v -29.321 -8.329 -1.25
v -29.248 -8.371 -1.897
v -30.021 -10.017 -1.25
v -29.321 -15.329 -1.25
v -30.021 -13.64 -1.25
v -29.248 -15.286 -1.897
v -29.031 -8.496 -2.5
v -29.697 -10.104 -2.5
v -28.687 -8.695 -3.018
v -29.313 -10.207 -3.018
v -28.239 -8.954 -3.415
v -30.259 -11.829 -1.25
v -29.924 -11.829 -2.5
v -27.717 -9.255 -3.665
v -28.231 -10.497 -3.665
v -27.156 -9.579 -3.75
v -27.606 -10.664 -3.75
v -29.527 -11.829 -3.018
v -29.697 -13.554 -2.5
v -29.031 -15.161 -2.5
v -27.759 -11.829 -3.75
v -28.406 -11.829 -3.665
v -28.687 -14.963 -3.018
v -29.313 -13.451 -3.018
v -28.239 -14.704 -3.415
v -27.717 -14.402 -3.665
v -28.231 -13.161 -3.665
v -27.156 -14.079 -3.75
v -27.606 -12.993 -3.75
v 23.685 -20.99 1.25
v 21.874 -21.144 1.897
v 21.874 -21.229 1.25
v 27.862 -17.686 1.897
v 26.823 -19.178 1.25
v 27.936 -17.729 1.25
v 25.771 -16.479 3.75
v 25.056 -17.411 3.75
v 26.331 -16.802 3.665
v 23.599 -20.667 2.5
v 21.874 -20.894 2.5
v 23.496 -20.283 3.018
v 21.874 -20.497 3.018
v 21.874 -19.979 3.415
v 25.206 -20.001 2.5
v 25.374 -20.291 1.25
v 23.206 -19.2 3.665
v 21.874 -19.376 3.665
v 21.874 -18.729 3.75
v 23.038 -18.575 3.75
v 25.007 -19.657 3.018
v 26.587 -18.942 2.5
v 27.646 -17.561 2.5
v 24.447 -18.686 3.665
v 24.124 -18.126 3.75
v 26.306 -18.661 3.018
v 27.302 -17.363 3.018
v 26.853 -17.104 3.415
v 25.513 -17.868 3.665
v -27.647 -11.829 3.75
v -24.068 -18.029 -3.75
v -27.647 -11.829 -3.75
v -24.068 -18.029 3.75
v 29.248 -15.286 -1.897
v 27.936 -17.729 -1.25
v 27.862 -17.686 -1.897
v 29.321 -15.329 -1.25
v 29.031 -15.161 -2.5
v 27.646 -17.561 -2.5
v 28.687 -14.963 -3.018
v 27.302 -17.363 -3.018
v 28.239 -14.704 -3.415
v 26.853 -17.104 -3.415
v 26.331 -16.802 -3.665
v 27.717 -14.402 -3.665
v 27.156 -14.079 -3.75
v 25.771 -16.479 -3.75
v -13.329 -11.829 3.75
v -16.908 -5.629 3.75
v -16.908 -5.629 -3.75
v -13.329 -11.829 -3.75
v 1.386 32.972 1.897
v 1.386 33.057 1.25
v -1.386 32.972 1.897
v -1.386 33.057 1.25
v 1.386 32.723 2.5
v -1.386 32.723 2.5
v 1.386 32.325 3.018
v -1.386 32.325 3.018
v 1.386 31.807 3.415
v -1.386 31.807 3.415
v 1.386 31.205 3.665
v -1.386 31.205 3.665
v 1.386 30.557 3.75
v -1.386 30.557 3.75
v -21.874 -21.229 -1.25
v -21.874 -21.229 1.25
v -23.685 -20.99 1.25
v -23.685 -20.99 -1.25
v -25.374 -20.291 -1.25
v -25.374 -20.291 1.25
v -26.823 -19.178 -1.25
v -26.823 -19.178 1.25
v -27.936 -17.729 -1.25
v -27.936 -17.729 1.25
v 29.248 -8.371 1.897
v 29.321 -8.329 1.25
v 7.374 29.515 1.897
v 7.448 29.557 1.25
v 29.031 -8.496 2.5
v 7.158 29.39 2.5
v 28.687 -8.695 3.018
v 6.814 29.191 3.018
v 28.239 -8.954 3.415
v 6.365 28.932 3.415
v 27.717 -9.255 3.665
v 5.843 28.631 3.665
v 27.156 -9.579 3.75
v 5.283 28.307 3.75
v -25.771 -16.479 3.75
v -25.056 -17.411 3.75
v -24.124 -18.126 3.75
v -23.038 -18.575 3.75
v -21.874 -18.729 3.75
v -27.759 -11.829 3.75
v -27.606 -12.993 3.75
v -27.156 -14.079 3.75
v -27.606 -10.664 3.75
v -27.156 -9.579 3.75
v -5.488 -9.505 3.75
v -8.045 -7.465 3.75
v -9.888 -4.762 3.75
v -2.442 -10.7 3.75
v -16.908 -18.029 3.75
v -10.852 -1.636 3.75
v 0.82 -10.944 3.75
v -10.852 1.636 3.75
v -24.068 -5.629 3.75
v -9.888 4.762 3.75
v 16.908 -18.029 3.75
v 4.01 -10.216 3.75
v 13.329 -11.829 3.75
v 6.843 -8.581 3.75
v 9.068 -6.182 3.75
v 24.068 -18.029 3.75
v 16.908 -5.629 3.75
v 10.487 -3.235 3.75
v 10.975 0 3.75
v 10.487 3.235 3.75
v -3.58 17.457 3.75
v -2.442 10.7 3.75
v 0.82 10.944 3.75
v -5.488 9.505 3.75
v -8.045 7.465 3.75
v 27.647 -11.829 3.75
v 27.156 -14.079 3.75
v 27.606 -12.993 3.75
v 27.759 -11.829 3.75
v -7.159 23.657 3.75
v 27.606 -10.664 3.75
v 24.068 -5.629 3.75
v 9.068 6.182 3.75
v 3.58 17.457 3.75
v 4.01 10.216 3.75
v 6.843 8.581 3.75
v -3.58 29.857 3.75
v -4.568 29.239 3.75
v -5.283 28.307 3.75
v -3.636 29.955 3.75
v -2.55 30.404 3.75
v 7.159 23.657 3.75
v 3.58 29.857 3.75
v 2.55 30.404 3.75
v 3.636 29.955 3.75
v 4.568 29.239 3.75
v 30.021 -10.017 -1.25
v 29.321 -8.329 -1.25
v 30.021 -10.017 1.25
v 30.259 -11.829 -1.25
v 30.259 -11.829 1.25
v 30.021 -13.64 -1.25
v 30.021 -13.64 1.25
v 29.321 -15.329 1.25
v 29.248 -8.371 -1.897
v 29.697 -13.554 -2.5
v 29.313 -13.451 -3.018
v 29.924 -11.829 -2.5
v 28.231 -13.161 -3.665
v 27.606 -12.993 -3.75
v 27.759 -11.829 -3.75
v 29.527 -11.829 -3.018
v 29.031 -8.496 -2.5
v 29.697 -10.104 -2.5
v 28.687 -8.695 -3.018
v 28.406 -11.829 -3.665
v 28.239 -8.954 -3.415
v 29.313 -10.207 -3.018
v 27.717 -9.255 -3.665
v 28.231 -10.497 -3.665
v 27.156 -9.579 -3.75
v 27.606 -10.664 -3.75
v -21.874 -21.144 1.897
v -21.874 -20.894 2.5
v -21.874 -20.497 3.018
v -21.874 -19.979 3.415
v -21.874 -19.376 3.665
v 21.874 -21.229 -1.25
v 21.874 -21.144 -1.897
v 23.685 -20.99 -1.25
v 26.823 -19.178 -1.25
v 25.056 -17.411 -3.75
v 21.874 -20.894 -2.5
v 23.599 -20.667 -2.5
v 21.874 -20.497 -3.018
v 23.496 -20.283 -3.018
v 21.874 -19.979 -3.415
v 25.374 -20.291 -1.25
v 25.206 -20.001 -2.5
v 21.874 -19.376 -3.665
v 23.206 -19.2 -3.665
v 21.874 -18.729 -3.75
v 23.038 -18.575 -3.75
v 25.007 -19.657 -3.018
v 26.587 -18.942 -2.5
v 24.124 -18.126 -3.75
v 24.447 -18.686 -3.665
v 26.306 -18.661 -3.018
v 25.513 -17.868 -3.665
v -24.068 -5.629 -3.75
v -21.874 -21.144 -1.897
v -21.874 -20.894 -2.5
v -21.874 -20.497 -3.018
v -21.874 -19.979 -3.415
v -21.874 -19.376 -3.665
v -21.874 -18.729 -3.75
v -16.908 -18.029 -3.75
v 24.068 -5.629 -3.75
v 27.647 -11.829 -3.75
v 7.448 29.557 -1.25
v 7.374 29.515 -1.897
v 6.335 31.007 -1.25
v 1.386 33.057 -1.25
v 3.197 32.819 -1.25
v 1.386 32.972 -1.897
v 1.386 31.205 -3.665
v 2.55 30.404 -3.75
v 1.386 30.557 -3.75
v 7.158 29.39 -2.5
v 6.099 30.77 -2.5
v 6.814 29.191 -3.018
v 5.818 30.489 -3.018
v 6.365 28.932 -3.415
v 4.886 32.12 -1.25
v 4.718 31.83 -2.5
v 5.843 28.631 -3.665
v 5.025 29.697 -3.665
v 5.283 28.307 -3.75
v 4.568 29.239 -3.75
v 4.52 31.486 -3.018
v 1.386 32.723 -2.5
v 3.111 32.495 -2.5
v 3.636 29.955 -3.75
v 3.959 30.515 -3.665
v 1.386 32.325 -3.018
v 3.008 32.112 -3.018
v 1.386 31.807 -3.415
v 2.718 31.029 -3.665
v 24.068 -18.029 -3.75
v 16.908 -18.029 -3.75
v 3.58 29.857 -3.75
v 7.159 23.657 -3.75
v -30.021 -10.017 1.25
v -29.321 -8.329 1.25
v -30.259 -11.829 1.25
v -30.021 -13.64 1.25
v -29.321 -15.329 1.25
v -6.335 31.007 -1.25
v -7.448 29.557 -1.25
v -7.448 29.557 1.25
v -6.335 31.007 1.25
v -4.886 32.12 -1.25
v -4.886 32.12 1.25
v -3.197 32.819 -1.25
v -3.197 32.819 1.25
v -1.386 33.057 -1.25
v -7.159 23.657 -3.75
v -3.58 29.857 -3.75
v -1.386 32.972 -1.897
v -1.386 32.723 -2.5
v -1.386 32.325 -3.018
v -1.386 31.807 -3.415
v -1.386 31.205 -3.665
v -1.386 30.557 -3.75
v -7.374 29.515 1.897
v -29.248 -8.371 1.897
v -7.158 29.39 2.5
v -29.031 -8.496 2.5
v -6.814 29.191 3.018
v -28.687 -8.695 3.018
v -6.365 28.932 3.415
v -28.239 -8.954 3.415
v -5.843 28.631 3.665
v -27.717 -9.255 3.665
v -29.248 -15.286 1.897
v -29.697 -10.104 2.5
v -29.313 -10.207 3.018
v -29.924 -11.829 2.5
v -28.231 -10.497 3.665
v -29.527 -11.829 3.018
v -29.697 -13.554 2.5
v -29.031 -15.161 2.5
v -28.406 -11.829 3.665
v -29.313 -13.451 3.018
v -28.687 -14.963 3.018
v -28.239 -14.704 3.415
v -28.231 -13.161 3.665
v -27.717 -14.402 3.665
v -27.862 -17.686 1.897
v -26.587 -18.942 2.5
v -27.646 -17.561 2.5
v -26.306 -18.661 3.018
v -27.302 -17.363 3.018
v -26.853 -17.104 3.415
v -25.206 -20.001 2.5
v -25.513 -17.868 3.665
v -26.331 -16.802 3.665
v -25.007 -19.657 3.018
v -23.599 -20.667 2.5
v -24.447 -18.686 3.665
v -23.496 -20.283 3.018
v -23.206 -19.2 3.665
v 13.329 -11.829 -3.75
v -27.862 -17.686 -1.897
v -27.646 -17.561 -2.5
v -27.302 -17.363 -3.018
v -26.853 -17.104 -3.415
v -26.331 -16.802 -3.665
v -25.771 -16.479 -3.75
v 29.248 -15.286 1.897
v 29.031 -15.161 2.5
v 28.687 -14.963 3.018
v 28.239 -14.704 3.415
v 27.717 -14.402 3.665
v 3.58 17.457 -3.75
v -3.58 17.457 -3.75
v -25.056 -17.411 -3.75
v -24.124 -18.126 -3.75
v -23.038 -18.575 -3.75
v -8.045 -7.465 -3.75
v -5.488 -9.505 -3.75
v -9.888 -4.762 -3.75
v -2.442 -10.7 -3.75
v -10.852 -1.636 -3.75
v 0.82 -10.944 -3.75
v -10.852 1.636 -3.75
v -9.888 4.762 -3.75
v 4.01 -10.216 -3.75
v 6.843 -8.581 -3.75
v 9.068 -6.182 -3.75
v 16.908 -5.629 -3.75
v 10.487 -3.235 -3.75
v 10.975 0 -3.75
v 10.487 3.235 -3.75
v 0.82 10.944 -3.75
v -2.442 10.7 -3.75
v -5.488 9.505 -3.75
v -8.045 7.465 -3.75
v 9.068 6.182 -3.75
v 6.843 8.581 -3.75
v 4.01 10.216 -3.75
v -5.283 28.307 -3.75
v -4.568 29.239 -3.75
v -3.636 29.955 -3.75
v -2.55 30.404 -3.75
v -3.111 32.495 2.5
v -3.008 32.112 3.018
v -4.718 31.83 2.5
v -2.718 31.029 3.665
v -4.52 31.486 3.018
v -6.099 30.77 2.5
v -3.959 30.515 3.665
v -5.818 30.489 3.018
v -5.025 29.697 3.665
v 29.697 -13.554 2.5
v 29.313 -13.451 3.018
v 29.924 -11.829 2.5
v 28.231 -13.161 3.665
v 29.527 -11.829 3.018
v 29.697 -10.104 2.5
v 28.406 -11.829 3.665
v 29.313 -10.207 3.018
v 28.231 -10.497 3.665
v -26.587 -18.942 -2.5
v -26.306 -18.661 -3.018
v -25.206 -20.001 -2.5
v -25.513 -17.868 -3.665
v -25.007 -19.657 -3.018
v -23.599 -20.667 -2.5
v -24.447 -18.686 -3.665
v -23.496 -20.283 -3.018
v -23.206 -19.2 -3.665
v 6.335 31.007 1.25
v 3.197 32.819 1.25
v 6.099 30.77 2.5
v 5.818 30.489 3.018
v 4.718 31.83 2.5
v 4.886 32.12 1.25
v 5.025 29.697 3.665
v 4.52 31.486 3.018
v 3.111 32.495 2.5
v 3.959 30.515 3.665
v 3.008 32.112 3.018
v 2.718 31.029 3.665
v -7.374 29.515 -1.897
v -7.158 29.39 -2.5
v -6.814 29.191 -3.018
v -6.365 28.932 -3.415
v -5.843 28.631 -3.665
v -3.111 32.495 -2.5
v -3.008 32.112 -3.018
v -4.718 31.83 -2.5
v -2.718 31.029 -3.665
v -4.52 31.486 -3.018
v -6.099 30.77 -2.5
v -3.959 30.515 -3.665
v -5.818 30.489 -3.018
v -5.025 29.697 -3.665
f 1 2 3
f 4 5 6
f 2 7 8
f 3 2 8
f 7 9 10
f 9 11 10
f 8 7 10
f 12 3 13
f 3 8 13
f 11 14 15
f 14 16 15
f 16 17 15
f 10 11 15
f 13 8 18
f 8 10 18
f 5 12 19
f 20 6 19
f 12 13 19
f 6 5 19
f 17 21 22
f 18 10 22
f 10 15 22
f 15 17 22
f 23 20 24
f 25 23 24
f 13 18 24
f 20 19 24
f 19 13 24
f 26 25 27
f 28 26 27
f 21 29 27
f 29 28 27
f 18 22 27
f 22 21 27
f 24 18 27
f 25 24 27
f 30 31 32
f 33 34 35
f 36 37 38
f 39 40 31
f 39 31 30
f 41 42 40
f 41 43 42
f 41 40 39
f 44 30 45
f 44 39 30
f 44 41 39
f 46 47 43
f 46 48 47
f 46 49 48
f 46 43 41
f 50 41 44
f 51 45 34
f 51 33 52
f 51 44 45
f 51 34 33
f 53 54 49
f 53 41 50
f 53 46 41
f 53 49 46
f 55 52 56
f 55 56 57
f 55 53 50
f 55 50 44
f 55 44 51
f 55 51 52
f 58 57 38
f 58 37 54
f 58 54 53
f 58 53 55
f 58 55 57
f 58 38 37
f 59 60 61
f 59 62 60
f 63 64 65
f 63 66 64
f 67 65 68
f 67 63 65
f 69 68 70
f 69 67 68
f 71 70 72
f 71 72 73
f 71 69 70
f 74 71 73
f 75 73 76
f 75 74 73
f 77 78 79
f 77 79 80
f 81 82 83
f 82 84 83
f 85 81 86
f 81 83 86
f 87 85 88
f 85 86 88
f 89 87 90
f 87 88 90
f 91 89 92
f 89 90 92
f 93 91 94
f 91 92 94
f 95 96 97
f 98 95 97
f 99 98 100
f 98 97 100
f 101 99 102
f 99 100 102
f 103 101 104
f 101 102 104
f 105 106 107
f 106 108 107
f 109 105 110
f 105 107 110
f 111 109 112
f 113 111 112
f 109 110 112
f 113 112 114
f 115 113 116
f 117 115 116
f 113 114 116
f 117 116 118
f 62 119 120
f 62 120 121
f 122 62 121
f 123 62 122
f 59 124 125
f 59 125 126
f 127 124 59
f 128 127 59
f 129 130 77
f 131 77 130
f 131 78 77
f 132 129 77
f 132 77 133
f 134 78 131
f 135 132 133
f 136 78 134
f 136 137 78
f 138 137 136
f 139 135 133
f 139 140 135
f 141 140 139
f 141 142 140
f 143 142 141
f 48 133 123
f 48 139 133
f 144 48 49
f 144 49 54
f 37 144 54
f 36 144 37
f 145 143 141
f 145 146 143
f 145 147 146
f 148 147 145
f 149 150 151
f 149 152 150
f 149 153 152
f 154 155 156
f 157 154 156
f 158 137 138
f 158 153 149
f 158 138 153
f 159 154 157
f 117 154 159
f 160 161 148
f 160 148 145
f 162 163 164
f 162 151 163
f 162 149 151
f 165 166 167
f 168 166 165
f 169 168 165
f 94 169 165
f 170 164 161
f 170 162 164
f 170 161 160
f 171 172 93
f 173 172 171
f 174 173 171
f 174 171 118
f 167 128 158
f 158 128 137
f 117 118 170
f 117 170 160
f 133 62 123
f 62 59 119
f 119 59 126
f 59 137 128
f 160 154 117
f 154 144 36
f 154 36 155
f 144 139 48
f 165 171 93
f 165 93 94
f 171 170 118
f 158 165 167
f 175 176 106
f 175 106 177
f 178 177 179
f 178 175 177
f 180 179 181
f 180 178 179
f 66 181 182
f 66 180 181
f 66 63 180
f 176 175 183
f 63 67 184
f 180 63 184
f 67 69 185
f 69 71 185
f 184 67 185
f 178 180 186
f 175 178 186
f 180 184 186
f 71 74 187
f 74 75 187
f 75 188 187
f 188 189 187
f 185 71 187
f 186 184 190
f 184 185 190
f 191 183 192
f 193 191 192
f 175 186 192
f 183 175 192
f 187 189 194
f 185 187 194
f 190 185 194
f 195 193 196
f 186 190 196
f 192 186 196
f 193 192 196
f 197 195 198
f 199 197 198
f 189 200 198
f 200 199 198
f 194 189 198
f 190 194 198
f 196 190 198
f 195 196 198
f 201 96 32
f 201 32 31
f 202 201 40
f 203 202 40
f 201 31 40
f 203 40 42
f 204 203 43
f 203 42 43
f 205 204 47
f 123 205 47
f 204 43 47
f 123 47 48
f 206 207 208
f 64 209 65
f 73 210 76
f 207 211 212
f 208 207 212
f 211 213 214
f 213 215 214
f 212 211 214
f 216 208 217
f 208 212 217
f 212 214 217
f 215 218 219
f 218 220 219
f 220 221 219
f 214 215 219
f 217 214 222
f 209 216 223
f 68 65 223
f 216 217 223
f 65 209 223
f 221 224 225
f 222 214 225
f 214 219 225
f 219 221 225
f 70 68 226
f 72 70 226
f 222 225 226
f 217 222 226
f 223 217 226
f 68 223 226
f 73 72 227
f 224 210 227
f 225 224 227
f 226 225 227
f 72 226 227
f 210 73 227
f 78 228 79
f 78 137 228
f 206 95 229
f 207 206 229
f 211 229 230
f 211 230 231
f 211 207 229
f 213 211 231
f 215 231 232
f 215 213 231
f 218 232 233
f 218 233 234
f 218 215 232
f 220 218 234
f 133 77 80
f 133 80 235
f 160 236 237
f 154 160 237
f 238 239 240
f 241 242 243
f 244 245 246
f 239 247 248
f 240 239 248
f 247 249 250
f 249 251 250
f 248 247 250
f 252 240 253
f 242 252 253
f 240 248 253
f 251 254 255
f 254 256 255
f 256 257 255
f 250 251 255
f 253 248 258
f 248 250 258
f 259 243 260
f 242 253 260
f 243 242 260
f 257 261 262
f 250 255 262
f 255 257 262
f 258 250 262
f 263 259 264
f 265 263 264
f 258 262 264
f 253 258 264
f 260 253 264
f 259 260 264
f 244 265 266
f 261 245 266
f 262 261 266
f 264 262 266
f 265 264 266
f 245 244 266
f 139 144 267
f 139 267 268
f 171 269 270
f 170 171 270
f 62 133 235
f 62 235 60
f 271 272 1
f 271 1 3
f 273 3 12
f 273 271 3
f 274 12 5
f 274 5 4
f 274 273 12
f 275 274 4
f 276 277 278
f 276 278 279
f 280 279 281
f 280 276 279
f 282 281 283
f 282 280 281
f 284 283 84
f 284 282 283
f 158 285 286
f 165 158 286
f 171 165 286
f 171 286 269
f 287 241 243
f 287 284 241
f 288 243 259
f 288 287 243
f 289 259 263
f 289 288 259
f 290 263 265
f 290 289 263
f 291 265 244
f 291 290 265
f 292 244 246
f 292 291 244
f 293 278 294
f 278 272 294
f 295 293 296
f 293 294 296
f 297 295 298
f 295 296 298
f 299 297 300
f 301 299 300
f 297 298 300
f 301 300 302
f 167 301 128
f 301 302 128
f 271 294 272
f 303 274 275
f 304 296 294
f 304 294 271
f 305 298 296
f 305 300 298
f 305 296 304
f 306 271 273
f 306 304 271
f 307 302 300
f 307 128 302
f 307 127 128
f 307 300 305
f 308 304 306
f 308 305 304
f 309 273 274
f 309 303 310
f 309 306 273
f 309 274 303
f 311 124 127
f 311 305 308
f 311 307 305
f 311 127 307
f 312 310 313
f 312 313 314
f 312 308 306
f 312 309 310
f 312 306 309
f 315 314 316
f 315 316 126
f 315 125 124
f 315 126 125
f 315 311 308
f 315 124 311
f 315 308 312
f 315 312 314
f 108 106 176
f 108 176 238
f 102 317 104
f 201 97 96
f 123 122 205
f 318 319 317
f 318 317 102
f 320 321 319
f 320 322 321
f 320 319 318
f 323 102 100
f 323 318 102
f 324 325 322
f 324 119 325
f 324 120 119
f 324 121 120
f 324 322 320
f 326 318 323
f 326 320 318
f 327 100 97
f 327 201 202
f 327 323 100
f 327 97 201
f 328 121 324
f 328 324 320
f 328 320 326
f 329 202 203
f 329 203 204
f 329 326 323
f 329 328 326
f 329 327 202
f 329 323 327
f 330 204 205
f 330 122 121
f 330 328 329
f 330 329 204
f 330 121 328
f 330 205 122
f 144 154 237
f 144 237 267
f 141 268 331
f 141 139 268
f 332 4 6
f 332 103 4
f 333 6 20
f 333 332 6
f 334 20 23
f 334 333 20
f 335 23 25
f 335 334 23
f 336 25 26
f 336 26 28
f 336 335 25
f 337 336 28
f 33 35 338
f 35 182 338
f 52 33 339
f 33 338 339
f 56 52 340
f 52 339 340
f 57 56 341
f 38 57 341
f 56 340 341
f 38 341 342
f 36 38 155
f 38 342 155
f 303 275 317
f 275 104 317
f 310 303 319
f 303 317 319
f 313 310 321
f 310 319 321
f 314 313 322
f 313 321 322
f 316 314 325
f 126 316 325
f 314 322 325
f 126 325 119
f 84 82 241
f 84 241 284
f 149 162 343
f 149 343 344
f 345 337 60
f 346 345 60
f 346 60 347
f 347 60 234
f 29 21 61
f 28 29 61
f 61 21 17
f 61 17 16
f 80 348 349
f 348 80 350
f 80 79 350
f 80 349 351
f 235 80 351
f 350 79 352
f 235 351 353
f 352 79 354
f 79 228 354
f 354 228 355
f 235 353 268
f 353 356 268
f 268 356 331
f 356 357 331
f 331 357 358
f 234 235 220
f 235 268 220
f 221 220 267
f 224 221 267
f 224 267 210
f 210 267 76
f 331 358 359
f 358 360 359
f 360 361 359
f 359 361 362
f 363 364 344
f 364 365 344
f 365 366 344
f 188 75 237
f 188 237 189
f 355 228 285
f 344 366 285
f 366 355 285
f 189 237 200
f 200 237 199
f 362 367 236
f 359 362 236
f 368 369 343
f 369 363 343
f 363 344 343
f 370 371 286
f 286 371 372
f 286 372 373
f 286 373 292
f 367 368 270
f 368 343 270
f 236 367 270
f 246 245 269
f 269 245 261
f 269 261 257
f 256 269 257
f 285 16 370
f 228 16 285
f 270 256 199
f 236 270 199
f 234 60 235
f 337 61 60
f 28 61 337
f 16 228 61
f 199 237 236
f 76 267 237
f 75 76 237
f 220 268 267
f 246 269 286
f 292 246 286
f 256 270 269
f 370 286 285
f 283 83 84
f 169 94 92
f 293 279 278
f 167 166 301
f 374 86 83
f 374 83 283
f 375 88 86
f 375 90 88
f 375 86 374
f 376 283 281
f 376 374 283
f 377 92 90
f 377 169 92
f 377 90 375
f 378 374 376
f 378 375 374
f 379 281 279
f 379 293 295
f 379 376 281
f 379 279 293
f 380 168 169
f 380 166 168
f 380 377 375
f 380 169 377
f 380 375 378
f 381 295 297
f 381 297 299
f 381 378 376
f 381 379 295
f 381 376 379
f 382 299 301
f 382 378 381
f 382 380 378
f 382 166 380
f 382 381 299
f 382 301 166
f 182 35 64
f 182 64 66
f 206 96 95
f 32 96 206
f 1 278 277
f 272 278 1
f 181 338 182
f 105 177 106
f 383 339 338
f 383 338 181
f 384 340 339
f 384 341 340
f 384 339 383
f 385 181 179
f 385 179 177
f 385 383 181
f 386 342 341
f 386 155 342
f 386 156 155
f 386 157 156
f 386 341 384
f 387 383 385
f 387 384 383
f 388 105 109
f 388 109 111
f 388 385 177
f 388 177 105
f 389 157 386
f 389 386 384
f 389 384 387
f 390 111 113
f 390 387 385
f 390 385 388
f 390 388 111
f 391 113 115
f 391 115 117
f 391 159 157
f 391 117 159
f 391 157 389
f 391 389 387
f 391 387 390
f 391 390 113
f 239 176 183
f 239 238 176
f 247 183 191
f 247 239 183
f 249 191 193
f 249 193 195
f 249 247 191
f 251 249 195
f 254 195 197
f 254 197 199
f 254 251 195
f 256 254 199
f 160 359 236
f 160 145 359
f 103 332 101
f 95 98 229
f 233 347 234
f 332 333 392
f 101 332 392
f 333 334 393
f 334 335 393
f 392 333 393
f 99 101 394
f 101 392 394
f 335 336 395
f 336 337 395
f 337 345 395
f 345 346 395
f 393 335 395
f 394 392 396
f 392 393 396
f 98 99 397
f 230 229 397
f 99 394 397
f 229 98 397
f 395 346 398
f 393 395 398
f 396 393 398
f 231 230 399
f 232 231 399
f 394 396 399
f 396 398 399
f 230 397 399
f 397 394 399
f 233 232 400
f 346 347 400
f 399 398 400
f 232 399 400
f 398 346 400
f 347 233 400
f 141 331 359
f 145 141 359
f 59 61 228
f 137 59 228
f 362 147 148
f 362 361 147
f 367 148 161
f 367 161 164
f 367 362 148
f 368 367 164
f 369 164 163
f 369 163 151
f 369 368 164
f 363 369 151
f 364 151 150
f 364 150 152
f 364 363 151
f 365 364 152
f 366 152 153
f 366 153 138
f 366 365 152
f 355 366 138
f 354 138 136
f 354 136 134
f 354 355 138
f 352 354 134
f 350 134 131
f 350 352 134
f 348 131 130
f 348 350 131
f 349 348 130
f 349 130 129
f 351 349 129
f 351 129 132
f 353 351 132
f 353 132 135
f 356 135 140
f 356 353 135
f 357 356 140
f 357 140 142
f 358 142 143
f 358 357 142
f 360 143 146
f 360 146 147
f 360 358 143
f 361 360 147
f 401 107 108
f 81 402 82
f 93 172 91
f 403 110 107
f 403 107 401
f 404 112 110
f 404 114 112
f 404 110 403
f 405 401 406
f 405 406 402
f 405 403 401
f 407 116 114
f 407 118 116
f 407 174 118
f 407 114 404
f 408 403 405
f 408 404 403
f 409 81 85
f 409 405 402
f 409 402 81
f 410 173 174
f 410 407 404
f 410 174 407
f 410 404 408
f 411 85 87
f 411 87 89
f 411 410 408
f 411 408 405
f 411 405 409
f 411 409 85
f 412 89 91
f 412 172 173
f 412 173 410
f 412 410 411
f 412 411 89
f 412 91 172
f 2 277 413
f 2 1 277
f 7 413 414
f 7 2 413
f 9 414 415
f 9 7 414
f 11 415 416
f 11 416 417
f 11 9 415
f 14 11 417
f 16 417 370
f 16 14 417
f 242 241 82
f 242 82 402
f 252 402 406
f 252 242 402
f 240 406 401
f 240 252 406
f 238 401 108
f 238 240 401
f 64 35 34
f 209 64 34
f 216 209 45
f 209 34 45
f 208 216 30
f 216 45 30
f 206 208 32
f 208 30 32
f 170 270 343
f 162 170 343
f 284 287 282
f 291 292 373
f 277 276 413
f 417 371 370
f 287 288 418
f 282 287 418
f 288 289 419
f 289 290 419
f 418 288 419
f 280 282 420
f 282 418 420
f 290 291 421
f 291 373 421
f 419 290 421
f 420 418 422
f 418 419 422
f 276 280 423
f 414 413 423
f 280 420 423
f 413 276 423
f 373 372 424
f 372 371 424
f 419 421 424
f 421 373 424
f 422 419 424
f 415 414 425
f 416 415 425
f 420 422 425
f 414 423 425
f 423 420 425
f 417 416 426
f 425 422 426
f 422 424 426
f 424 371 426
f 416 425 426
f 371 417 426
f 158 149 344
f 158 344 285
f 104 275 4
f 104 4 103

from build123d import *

# Parameters (mm, degrees)
F0_R     = 10.975
F1_DEPTH = 3.75
F2_R     = 7
F3_R     = 2.5


# Not quite as in the source:
# - a feature names something its author has since deleted; it is built from what else it names


with BuildPart() as f1:
    # F0 (on Top) → F1 (new body, symmetric)
    with BuildSketch(Plane.XY):
        Polygon((-5.4270925304, 33.057475201), (-10.8541850608, 23.657475201), (-25.9150670439, -2.4287376005), (-31.3421595743, -11.8287376005), (-25.9150670439, -21.2287376005), (-15.0608819831, -21.2287376005), (15.0608819831, -21.2287376005), (25.9150670439, -21.2287376005), (31.3421595743, -11.8287376005), (25.9150670439, -2.4287376005), (10.8541850608, 23.657475201), (5.4270925304, 33.057475201), align=None)
        Polygon((-16.9084028445, -5.6287376005), (-13.3288311755, -11.8287376005), (-16.9084028445, -18.0287376005), (-24.0675461825, -18.0287376005), (-27.6471178514, -11.8287376005), (-24.0675461825, -5.6287376005), align=None, mode=Mode.SUBTRACT)
        Circle(F0_R, mode=Mode.SUBTRACT)
        Polygon((24.0675461825, -5.6287376005), (27.6471178514, -11.8287376005), (24.0675461825, -18.0287376005), (16.9084028445, -18.0287376005), (13.3288311755, -11.8287376005), (16.9084028445, -5.6287376005), align=None, mode=Mode.SUBTRACT)
        Polygon((3.579571669, 29.857475201), (7.159143338, 23.657475201), (3.579571669, 17.457475201), (-3.579571669, 17.457475201), (-7.159143338, 23.657475201), (-3.579571669, 29.857475201), align=None, mode=Mode.SUBTRACT)
    extrude(amount=F1_DEPTH, both=True)

    # F2
    f2_edges = [f1.edges().sort_by_distance(p)[0] for p in [
        (31.34216, -11.828738, 0),
        (25.915067, -21.228738, 0),
        (-25.915067, -21.228738, 0),
        (-31.34216, -11.828738, 0),
        (-5.427093, 33.057475, 0),
        (5.427093, 33.057475, 0),
    ]]
    fillet(f2_edges, radius=F2_R)

    # F3
    f3_edges = [f1.edges().sort_by_distance(p)[0] for p in [
        (-18.384626, 10.614369, -3.75),
        (-7.447818, 29.557475, 0),
        (-29.321434, -8.328738, 0),
        (-18.384626, 10.614369, 3.75),
    ]]
    fillet(f3_edges, radius=F3_R)


solid = f1.part
